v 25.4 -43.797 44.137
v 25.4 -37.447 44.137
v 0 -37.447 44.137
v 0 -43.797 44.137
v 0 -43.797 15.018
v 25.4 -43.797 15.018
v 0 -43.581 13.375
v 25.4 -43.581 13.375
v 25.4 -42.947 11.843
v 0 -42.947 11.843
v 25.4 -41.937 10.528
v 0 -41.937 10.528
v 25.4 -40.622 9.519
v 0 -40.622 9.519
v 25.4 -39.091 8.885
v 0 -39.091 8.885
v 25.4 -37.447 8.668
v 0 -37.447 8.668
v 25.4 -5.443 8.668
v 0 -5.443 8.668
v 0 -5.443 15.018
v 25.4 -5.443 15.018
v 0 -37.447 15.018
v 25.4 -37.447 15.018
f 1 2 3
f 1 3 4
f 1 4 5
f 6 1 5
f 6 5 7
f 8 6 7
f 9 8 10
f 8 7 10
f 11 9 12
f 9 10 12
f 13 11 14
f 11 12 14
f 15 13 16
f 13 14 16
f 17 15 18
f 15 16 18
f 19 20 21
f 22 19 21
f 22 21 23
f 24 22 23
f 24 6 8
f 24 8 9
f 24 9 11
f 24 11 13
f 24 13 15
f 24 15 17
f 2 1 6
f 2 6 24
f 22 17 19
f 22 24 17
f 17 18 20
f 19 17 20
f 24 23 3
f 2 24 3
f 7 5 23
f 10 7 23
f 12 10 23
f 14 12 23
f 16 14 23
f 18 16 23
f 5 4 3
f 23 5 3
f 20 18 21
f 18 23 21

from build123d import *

# Parameters (mm, degrees)
F1_DEPTH = 25.4


with BuildPart() as f1:
    # F0 (on Right) → F1 (new body)
    with BuildSketch(Plane.YZ):
        with BuildLine():
            Line((-37.447304, 15.018271), (-37.447304, 44.136662))
            Line((-37.447304, 44.136662), (-43.797303, 44.136662))
            Line((-43.797303, 44.136662), (-43.797303, 15.018271))
            ThreePointArc((-43.797303, 15.018271), (-41.937432, 10.528143), (-37.447304, 8.668271))
            Line((-37.447304, 8.668271), (-5.443305, 8.668271))
            Line((-5.443305, 8.668271), (-5.443305, 15.018271))
            Line((-5.443305, 15.018271), (-37.447304, 15.018271))
        make_face()
    extrude(amount=F1_DEPTH)


solid = f1.part
